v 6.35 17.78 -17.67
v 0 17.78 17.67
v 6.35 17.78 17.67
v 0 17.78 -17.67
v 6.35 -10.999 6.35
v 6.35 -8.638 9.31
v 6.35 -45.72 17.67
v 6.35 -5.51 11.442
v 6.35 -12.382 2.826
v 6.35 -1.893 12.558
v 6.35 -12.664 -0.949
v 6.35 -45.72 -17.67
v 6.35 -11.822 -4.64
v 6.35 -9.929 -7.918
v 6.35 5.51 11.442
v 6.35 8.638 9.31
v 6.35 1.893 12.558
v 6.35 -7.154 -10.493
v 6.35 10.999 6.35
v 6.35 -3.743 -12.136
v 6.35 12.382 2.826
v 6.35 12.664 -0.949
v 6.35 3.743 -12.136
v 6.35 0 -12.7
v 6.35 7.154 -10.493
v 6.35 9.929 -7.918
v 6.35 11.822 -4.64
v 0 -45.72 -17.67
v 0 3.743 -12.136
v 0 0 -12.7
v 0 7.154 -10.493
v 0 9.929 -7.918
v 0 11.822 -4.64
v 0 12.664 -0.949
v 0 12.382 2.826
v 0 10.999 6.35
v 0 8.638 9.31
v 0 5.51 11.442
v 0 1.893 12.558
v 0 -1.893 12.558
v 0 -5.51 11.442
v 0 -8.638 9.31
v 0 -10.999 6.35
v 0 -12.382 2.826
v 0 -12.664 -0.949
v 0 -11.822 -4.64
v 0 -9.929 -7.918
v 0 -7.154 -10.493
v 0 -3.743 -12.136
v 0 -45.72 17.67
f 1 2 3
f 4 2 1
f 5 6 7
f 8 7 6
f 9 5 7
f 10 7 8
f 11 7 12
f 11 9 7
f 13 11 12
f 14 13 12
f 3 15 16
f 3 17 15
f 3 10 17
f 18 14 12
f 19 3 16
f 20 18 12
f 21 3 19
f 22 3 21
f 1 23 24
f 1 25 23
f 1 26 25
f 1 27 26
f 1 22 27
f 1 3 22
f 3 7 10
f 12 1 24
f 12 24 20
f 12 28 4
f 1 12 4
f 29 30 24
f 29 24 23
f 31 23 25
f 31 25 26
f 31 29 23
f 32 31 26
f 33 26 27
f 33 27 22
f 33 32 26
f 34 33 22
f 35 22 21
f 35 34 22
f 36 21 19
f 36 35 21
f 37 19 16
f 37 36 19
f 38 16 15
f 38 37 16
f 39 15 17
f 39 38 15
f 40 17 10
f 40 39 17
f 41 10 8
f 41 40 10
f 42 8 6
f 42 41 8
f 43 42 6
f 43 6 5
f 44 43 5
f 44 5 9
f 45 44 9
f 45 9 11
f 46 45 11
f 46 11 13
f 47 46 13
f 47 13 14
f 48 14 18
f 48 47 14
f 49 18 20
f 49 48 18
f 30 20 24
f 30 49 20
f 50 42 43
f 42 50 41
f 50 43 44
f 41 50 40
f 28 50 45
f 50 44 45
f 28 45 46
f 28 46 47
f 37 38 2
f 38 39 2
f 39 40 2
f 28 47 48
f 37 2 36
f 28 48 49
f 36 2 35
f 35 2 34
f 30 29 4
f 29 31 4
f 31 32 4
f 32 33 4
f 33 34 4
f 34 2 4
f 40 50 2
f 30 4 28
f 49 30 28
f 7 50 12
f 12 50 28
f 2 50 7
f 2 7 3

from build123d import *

# Parameters (mm, degrees)
SKETCH1_W           = 35.339607518
SKETCH1_H           = 63.5
SKETCH1_R           = 12.7
BOSS_EXTRUDE1_DEPTH = 6.35


with BuildPart() as part:
    # Sketch1 → Boss-Extrude1 (new body)
    with BuildSketch(Plane(origin=(0, 0, 0), x_dir=(0, 0, -1), z_dir=(1, 0, 0))):
        with Locations((0, -13.97)):
            Rectangle(SKETCH1_W, SKETCH1_H)
        Circle(SKETCH1_R, mode=Mode.SUBTRACT)
    extrude(amount=BOSS_EXTRUDE1_DEPTH)


solid = part.part
